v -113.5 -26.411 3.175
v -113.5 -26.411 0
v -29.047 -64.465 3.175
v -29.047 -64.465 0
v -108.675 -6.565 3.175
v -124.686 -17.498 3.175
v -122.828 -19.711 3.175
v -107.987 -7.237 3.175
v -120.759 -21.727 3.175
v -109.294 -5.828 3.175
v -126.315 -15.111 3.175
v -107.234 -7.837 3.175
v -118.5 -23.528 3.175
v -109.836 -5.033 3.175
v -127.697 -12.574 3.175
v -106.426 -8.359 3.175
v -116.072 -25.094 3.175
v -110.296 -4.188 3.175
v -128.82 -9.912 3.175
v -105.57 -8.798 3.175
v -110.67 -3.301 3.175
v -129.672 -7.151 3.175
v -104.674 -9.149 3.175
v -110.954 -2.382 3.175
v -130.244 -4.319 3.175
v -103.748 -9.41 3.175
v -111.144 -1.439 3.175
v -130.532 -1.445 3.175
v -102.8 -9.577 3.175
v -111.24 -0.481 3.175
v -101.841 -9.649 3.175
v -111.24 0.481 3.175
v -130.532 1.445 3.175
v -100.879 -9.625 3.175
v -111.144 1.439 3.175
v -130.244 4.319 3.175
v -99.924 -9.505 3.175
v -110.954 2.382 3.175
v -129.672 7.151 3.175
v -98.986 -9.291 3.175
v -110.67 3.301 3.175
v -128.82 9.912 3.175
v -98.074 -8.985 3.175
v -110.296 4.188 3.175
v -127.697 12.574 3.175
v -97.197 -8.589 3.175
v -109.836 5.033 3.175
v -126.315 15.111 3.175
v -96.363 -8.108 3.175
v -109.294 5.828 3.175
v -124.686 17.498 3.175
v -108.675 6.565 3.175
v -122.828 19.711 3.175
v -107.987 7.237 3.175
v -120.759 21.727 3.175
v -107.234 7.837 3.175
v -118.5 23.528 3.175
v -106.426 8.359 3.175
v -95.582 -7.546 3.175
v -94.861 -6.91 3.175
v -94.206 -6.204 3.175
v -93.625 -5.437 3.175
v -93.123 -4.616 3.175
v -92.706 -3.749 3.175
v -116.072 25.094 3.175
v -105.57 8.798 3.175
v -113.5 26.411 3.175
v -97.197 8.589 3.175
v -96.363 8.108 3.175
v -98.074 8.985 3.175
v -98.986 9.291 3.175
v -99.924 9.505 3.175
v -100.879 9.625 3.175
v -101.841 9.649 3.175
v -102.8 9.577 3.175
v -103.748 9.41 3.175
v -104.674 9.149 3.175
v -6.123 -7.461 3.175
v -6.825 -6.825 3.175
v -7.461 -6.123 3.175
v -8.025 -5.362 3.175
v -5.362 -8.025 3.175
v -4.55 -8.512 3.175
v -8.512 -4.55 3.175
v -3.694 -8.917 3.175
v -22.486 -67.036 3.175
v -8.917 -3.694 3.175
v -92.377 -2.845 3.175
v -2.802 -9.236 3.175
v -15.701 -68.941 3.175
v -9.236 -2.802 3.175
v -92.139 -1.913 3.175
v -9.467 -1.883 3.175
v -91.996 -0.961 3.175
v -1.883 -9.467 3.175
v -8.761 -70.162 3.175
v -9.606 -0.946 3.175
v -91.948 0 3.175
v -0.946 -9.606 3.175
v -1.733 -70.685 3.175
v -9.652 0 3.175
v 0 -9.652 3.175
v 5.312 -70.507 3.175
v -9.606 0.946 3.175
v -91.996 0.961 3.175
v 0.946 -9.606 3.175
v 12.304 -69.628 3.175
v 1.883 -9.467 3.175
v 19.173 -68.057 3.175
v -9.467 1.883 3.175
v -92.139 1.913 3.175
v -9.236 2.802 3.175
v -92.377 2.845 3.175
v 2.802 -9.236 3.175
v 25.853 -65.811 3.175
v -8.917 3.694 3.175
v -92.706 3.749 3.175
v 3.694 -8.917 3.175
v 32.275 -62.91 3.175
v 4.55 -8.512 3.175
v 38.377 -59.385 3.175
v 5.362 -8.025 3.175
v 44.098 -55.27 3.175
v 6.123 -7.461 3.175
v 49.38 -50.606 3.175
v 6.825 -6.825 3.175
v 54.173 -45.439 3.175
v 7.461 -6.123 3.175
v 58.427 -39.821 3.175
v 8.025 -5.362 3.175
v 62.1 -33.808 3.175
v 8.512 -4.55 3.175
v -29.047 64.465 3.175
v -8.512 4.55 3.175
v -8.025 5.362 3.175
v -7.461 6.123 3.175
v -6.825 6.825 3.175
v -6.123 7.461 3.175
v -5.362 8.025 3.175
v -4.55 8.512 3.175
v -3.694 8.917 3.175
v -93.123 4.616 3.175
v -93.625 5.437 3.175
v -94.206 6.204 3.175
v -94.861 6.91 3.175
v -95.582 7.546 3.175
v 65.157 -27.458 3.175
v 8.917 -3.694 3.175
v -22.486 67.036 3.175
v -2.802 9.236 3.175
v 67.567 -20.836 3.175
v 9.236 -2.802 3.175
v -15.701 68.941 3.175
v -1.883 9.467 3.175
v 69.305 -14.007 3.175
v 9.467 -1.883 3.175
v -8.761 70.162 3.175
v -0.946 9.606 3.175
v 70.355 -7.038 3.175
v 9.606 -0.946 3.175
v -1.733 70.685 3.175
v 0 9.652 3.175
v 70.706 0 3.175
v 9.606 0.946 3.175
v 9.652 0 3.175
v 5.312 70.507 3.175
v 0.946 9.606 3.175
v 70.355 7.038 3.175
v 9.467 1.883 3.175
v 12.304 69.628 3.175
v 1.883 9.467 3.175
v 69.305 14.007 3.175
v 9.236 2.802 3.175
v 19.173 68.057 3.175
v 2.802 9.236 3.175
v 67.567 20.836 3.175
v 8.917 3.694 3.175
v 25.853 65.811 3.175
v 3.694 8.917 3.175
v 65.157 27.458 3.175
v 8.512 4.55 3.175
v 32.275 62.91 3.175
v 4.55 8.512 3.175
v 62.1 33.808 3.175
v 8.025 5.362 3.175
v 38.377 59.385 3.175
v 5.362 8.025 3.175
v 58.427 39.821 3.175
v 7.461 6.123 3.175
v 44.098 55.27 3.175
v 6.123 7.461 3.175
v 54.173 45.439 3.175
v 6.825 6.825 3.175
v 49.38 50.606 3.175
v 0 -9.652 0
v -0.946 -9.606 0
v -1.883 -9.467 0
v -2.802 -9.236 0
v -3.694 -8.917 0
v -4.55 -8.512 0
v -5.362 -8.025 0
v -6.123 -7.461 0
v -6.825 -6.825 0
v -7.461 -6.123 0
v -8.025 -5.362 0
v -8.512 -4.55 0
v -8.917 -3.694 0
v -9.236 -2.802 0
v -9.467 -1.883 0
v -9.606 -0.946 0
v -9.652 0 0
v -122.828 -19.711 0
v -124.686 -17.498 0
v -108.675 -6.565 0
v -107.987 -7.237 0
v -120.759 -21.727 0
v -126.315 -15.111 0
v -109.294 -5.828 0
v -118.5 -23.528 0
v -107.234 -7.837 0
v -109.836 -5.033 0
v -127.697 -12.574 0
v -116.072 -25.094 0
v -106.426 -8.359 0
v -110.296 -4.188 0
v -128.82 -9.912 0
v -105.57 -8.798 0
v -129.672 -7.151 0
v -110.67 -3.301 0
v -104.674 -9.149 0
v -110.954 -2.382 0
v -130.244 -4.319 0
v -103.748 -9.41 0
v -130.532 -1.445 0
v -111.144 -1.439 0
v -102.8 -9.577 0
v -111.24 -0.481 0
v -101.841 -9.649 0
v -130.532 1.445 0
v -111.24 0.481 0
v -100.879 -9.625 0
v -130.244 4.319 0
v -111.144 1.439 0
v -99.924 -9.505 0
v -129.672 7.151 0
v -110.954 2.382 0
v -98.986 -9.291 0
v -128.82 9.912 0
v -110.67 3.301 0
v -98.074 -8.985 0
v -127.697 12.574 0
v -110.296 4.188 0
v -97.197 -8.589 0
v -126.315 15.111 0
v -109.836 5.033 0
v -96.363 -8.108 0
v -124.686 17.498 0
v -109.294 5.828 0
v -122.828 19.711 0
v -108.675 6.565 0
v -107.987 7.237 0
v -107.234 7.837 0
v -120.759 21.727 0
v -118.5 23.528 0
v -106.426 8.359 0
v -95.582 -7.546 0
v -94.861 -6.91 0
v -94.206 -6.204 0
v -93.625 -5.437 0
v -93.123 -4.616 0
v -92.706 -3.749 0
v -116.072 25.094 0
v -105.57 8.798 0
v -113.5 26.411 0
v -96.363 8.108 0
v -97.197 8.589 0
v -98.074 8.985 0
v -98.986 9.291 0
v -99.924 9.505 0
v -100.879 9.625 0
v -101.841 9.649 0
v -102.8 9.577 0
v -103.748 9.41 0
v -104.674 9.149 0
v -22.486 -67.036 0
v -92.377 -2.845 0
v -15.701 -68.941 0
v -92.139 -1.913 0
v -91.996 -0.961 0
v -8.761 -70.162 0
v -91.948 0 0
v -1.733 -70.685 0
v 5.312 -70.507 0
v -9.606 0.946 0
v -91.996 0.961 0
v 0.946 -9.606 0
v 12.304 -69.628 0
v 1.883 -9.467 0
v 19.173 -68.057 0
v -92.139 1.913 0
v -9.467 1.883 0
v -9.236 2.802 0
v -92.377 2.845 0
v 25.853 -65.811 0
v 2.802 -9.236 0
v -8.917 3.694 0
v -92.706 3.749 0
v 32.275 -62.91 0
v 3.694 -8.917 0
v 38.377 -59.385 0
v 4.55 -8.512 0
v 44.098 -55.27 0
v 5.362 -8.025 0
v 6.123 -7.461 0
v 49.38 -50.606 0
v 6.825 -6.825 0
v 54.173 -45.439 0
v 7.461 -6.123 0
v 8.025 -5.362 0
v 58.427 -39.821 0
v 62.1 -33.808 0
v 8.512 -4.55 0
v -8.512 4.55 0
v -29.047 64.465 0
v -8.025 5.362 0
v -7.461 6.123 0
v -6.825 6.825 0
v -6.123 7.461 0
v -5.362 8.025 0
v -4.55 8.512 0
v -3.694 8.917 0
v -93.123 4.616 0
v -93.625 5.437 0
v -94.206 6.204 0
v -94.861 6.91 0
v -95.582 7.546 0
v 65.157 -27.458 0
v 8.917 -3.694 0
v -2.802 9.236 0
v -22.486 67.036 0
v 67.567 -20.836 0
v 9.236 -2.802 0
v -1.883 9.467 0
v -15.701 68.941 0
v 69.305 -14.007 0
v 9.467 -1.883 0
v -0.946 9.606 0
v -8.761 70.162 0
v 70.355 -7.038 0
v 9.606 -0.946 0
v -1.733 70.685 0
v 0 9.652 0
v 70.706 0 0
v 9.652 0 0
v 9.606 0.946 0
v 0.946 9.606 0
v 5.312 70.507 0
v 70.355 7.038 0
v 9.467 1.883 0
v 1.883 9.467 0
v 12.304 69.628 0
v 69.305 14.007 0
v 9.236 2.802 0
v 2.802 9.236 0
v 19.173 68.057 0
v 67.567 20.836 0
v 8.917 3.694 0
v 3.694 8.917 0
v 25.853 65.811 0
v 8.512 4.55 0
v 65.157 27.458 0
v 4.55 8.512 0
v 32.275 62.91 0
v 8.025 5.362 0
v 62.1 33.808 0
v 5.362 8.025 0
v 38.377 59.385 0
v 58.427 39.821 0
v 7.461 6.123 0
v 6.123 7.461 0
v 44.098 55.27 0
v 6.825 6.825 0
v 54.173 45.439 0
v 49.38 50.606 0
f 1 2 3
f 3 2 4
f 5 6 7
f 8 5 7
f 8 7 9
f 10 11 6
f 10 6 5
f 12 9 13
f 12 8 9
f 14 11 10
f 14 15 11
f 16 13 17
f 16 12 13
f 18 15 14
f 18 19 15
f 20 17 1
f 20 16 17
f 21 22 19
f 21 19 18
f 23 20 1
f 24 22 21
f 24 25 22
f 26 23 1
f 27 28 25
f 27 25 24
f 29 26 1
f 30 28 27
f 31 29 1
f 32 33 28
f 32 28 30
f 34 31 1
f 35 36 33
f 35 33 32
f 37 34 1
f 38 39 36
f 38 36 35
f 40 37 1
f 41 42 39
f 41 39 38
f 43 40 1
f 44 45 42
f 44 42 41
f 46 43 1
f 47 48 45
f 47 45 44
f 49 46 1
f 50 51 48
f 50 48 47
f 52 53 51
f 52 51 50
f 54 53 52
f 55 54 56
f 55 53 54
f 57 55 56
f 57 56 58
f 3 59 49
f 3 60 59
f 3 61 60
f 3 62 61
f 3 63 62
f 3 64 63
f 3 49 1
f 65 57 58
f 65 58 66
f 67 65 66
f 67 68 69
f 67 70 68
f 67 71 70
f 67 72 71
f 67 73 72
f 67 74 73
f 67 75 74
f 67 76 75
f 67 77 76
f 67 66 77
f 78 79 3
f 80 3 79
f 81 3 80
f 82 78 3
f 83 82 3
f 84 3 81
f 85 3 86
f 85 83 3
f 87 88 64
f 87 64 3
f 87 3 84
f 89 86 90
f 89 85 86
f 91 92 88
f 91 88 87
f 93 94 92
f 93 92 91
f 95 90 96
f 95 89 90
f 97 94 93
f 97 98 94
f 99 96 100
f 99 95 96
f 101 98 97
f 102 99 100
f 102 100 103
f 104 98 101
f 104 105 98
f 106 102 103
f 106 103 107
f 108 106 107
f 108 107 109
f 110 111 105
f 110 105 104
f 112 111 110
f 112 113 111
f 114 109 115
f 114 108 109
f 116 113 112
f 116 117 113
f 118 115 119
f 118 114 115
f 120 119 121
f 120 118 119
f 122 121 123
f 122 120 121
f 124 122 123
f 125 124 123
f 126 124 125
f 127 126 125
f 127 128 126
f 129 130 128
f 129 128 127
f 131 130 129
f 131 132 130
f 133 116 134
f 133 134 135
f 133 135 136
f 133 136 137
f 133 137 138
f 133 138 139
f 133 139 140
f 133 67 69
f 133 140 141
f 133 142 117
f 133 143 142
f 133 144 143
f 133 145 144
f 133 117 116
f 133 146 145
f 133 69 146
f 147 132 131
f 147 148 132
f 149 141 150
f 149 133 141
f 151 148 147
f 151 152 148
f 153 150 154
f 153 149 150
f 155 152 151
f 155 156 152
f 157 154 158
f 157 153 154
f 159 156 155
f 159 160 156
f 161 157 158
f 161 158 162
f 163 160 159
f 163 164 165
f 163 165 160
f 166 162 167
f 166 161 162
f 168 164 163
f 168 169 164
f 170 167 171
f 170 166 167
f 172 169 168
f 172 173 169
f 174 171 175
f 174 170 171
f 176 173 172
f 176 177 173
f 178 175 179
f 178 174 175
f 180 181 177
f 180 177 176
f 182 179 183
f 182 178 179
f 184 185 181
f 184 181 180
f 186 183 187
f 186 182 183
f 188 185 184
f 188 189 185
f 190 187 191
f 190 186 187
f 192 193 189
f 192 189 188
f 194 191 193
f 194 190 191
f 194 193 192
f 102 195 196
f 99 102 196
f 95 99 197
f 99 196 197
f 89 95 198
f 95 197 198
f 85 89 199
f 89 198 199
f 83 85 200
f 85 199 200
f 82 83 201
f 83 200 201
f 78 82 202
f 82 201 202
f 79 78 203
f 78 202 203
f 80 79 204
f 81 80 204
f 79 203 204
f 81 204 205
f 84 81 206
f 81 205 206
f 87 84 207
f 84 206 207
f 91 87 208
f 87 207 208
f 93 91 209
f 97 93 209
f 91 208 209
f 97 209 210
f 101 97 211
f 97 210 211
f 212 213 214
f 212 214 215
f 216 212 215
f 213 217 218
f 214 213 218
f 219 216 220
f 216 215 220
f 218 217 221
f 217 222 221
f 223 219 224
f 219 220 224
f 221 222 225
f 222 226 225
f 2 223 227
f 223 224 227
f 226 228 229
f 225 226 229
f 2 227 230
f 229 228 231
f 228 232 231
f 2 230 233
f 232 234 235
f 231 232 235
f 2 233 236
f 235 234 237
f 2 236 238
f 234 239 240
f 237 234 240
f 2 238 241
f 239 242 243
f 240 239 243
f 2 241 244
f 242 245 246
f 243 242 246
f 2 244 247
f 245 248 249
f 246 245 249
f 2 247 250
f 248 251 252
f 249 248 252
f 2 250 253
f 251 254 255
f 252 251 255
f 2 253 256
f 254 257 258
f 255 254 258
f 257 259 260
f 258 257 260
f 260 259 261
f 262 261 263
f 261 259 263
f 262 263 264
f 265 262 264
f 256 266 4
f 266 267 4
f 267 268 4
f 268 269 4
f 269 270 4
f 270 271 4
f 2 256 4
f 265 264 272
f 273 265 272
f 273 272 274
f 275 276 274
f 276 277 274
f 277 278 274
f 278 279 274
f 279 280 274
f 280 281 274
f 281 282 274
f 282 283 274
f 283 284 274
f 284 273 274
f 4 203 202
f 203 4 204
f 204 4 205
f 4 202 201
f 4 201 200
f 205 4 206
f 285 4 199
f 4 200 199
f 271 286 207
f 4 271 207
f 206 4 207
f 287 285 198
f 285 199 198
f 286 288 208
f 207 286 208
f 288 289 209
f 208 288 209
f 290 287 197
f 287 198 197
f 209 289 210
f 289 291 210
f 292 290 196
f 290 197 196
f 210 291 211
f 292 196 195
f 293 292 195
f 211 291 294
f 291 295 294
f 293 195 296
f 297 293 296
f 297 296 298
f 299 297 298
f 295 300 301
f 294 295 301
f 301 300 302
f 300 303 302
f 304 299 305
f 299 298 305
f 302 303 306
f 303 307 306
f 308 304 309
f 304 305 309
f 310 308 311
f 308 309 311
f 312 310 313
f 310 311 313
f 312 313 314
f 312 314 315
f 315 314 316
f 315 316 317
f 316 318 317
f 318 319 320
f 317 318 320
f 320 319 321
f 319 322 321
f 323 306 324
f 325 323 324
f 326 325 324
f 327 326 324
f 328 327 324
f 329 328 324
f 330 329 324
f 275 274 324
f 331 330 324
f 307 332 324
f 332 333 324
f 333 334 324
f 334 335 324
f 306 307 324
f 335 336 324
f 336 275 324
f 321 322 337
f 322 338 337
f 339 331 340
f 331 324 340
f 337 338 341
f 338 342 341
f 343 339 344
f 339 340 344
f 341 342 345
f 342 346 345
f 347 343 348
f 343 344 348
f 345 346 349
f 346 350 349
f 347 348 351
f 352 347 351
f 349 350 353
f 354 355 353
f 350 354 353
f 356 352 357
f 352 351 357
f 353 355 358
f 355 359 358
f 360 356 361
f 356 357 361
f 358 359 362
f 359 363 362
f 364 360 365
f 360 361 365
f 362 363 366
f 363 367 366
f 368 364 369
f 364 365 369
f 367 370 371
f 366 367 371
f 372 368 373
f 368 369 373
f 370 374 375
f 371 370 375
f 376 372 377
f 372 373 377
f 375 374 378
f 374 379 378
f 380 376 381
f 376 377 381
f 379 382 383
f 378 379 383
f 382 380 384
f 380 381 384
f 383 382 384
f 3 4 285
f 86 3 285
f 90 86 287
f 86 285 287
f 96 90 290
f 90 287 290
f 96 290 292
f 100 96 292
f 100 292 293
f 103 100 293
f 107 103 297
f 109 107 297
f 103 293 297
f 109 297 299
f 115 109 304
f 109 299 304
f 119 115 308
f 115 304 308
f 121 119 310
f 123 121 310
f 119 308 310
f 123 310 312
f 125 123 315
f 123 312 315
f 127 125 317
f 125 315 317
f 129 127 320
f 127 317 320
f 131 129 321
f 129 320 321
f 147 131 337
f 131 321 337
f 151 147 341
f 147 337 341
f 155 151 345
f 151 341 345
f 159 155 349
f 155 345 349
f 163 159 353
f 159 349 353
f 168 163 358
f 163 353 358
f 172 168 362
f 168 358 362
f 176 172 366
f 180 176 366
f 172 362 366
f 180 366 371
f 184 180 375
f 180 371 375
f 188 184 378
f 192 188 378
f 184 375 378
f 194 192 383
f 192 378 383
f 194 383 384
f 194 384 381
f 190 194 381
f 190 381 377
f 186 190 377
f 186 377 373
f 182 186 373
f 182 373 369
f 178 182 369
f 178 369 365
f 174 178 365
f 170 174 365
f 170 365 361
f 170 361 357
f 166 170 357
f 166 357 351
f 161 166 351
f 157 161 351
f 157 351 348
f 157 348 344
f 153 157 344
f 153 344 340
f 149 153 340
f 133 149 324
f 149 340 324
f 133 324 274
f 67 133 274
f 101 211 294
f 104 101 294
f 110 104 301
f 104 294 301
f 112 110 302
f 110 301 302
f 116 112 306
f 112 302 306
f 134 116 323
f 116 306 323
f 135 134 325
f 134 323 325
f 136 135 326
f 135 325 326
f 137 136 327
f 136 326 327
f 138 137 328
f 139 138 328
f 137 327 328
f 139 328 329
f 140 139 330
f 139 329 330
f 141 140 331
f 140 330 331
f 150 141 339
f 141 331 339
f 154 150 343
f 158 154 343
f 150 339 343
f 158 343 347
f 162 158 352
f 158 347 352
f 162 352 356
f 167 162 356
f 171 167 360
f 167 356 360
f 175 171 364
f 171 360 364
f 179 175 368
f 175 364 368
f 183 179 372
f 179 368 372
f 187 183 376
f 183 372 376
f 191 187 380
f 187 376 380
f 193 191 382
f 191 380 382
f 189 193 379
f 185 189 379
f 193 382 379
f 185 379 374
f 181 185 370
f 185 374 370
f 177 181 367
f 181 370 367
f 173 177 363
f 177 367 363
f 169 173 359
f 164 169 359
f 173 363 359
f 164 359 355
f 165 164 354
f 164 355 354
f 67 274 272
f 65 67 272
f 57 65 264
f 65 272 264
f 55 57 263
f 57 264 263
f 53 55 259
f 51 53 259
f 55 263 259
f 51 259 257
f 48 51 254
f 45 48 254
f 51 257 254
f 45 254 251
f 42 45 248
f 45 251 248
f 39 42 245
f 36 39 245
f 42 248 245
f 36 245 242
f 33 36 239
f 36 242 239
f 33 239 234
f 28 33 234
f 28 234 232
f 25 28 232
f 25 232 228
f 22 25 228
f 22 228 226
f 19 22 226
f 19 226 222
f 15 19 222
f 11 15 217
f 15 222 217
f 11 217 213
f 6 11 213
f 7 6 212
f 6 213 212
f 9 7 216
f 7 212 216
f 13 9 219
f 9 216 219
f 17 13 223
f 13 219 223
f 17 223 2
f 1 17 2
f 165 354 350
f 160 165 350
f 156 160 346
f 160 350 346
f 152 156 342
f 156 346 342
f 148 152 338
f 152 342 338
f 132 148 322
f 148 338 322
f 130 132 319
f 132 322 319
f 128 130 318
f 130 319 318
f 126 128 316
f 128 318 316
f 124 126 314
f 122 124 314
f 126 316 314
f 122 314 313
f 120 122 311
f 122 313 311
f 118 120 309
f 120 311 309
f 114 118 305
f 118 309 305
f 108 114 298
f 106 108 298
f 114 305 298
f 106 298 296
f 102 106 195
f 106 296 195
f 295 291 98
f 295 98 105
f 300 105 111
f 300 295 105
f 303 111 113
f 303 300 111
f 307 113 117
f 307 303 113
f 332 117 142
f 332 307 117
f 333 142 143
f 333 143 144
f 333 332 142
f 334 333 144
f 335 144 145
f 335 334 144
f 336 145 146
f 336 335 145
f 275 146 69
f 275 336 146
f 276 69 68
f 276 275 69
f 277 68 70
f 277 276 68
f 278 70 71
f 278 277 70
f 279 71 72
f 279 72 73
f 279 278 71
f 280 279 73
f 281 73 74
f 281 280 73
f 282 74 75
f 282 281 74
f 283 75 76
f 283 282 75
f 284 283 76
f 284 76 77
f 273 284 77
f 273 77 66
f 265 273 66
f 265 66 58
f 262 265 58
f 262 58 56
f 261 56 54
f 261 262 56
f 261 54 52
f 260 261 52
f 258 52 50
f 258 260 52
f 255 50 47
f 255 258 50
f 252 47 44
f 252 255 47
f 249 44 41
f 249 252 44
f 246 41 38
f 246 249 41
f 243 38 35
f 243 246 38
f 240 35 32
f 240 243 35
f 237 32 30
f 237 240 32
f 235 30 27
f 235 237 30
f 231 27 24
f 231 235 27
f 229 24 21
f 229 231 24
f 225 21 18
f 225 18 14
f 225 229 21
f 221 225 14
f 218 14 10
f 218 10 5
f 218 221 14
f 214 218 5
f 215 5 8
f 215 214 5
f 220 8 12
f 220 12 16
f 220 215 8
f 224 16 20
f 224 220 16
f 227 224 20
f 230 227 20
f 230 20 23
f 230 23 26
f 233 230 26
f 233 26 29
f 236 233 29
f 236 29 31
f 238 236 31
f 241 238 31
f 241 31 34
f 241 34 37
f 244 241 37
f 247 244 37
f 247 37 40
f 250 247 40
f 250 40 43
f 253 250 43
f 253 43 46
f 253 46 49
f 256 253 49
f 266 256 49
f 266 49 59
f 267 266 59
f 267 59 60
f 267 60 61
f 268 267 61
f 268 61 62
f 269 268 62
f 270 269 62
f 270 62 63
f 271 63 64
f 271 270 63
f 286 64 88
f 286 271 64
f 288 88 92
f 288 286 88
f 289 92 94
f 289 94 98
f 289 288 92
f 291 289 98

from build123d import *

# Parameters (mm, degrees)
F0_R     = 13.9065
F0_R_2   = 9.652
F1_DEPTH = 3.175


# Not quite as in the source:
# - a length typed as a fraction of an inch, garbled in the dataset ("3 / 203.2 mm" for 3/8 in), is restored


with BuildPart() as f1:
    # F0 (on Top) → F1 (new body)
    with BuildSketch(Plane.XY):
        with BuildLine():
            Line((-29.0468705796, 64.4645603781), (-113.5004093806, 26.4109228888))
            ThreePointArc((-113.5004093806, 26.4109228888), (-130.5681996552, 0), (-113.5004093806, -26.4109228888))
            Line((-113.5004093806, -26.4109228888), (-29.0468705796, -64.4645603781))
            ThreePointArc((-29.0468705796, -64.4645603781), (70.706437014, 0), (-29.0468705796, 64.4645603781))
        make_face()
        with Locations((-101.6, 0)):
            Circle(F0_R, mode=Mode.SUBTRACT)
        with BuildLine():
            ThreePointArc((0, 64.77), (45.7993062175, 45.7993062175), (64.77, 0))
            ThreePointArc((64.77, 0), (45.7993062175, -45.7993062175), (0, -64.77))
            ThreePointArc((0, -64.77), (-45.7993062175, -45.7993062175), (-64.77, 0))
            ThreePointArc((-64.77, 0), (-45.7993062175, 45.7993062175), (0, 64.77))
        make_face(mode=Mode.SUBTRACT)
        with Locations((-101.6, 0)):
            Circle(F0_R)
        with Locations((-101.6, 0)):
            Circle(F0_R_2, mode=Mode.SUBTRACT)
        with BuildLine():
            Line((0, 9.652), (0, 64.77))
            ThreePointArc((0, 64.77), (-45.7993062175, 45.7993062175), (-64.77, 0))
            Line((-64.77, 0), (-9.652, 0))
            ThreePointArc((-9.652, 0), (-6.824994652, 6.824994652), (0, 9.652))
        make_face()
        with BuildLine():
            ThreePointArc((-64.77, 0), (-45.7993062175, -45.7993062175), (0, -64.77))
            Line((0, -64.77), (0, -9.652))
            ThreePointArc((0, -9.652), (-6.824994652, -6.824994652), (-9.652, 0))
            Line((-9.652, 0), (-64.77, 0))
        make_face()
        with BuildLine():
            ThreePointArc((0, -64.77), (45.7993062175, -45.7993062175), (64.77, 0))
            ThreePointArc((64.77, 0), (45.7993062175, 45.7993062175), (0, 64.77))
            Line((0, 64.77), (0, 9.652))
            ThreePointArc((0, 9.652), (6.824994652, 6.824994652), (9.652, 0))
            ThreePointArc((9.652, 0), (6.824994652, -6.824994652), (0, -9.652))
            Line((0, -9.652), (0, -64.77))
        make_face()
    extrude(amount=F1_DEPTH)


solid = f1.part
